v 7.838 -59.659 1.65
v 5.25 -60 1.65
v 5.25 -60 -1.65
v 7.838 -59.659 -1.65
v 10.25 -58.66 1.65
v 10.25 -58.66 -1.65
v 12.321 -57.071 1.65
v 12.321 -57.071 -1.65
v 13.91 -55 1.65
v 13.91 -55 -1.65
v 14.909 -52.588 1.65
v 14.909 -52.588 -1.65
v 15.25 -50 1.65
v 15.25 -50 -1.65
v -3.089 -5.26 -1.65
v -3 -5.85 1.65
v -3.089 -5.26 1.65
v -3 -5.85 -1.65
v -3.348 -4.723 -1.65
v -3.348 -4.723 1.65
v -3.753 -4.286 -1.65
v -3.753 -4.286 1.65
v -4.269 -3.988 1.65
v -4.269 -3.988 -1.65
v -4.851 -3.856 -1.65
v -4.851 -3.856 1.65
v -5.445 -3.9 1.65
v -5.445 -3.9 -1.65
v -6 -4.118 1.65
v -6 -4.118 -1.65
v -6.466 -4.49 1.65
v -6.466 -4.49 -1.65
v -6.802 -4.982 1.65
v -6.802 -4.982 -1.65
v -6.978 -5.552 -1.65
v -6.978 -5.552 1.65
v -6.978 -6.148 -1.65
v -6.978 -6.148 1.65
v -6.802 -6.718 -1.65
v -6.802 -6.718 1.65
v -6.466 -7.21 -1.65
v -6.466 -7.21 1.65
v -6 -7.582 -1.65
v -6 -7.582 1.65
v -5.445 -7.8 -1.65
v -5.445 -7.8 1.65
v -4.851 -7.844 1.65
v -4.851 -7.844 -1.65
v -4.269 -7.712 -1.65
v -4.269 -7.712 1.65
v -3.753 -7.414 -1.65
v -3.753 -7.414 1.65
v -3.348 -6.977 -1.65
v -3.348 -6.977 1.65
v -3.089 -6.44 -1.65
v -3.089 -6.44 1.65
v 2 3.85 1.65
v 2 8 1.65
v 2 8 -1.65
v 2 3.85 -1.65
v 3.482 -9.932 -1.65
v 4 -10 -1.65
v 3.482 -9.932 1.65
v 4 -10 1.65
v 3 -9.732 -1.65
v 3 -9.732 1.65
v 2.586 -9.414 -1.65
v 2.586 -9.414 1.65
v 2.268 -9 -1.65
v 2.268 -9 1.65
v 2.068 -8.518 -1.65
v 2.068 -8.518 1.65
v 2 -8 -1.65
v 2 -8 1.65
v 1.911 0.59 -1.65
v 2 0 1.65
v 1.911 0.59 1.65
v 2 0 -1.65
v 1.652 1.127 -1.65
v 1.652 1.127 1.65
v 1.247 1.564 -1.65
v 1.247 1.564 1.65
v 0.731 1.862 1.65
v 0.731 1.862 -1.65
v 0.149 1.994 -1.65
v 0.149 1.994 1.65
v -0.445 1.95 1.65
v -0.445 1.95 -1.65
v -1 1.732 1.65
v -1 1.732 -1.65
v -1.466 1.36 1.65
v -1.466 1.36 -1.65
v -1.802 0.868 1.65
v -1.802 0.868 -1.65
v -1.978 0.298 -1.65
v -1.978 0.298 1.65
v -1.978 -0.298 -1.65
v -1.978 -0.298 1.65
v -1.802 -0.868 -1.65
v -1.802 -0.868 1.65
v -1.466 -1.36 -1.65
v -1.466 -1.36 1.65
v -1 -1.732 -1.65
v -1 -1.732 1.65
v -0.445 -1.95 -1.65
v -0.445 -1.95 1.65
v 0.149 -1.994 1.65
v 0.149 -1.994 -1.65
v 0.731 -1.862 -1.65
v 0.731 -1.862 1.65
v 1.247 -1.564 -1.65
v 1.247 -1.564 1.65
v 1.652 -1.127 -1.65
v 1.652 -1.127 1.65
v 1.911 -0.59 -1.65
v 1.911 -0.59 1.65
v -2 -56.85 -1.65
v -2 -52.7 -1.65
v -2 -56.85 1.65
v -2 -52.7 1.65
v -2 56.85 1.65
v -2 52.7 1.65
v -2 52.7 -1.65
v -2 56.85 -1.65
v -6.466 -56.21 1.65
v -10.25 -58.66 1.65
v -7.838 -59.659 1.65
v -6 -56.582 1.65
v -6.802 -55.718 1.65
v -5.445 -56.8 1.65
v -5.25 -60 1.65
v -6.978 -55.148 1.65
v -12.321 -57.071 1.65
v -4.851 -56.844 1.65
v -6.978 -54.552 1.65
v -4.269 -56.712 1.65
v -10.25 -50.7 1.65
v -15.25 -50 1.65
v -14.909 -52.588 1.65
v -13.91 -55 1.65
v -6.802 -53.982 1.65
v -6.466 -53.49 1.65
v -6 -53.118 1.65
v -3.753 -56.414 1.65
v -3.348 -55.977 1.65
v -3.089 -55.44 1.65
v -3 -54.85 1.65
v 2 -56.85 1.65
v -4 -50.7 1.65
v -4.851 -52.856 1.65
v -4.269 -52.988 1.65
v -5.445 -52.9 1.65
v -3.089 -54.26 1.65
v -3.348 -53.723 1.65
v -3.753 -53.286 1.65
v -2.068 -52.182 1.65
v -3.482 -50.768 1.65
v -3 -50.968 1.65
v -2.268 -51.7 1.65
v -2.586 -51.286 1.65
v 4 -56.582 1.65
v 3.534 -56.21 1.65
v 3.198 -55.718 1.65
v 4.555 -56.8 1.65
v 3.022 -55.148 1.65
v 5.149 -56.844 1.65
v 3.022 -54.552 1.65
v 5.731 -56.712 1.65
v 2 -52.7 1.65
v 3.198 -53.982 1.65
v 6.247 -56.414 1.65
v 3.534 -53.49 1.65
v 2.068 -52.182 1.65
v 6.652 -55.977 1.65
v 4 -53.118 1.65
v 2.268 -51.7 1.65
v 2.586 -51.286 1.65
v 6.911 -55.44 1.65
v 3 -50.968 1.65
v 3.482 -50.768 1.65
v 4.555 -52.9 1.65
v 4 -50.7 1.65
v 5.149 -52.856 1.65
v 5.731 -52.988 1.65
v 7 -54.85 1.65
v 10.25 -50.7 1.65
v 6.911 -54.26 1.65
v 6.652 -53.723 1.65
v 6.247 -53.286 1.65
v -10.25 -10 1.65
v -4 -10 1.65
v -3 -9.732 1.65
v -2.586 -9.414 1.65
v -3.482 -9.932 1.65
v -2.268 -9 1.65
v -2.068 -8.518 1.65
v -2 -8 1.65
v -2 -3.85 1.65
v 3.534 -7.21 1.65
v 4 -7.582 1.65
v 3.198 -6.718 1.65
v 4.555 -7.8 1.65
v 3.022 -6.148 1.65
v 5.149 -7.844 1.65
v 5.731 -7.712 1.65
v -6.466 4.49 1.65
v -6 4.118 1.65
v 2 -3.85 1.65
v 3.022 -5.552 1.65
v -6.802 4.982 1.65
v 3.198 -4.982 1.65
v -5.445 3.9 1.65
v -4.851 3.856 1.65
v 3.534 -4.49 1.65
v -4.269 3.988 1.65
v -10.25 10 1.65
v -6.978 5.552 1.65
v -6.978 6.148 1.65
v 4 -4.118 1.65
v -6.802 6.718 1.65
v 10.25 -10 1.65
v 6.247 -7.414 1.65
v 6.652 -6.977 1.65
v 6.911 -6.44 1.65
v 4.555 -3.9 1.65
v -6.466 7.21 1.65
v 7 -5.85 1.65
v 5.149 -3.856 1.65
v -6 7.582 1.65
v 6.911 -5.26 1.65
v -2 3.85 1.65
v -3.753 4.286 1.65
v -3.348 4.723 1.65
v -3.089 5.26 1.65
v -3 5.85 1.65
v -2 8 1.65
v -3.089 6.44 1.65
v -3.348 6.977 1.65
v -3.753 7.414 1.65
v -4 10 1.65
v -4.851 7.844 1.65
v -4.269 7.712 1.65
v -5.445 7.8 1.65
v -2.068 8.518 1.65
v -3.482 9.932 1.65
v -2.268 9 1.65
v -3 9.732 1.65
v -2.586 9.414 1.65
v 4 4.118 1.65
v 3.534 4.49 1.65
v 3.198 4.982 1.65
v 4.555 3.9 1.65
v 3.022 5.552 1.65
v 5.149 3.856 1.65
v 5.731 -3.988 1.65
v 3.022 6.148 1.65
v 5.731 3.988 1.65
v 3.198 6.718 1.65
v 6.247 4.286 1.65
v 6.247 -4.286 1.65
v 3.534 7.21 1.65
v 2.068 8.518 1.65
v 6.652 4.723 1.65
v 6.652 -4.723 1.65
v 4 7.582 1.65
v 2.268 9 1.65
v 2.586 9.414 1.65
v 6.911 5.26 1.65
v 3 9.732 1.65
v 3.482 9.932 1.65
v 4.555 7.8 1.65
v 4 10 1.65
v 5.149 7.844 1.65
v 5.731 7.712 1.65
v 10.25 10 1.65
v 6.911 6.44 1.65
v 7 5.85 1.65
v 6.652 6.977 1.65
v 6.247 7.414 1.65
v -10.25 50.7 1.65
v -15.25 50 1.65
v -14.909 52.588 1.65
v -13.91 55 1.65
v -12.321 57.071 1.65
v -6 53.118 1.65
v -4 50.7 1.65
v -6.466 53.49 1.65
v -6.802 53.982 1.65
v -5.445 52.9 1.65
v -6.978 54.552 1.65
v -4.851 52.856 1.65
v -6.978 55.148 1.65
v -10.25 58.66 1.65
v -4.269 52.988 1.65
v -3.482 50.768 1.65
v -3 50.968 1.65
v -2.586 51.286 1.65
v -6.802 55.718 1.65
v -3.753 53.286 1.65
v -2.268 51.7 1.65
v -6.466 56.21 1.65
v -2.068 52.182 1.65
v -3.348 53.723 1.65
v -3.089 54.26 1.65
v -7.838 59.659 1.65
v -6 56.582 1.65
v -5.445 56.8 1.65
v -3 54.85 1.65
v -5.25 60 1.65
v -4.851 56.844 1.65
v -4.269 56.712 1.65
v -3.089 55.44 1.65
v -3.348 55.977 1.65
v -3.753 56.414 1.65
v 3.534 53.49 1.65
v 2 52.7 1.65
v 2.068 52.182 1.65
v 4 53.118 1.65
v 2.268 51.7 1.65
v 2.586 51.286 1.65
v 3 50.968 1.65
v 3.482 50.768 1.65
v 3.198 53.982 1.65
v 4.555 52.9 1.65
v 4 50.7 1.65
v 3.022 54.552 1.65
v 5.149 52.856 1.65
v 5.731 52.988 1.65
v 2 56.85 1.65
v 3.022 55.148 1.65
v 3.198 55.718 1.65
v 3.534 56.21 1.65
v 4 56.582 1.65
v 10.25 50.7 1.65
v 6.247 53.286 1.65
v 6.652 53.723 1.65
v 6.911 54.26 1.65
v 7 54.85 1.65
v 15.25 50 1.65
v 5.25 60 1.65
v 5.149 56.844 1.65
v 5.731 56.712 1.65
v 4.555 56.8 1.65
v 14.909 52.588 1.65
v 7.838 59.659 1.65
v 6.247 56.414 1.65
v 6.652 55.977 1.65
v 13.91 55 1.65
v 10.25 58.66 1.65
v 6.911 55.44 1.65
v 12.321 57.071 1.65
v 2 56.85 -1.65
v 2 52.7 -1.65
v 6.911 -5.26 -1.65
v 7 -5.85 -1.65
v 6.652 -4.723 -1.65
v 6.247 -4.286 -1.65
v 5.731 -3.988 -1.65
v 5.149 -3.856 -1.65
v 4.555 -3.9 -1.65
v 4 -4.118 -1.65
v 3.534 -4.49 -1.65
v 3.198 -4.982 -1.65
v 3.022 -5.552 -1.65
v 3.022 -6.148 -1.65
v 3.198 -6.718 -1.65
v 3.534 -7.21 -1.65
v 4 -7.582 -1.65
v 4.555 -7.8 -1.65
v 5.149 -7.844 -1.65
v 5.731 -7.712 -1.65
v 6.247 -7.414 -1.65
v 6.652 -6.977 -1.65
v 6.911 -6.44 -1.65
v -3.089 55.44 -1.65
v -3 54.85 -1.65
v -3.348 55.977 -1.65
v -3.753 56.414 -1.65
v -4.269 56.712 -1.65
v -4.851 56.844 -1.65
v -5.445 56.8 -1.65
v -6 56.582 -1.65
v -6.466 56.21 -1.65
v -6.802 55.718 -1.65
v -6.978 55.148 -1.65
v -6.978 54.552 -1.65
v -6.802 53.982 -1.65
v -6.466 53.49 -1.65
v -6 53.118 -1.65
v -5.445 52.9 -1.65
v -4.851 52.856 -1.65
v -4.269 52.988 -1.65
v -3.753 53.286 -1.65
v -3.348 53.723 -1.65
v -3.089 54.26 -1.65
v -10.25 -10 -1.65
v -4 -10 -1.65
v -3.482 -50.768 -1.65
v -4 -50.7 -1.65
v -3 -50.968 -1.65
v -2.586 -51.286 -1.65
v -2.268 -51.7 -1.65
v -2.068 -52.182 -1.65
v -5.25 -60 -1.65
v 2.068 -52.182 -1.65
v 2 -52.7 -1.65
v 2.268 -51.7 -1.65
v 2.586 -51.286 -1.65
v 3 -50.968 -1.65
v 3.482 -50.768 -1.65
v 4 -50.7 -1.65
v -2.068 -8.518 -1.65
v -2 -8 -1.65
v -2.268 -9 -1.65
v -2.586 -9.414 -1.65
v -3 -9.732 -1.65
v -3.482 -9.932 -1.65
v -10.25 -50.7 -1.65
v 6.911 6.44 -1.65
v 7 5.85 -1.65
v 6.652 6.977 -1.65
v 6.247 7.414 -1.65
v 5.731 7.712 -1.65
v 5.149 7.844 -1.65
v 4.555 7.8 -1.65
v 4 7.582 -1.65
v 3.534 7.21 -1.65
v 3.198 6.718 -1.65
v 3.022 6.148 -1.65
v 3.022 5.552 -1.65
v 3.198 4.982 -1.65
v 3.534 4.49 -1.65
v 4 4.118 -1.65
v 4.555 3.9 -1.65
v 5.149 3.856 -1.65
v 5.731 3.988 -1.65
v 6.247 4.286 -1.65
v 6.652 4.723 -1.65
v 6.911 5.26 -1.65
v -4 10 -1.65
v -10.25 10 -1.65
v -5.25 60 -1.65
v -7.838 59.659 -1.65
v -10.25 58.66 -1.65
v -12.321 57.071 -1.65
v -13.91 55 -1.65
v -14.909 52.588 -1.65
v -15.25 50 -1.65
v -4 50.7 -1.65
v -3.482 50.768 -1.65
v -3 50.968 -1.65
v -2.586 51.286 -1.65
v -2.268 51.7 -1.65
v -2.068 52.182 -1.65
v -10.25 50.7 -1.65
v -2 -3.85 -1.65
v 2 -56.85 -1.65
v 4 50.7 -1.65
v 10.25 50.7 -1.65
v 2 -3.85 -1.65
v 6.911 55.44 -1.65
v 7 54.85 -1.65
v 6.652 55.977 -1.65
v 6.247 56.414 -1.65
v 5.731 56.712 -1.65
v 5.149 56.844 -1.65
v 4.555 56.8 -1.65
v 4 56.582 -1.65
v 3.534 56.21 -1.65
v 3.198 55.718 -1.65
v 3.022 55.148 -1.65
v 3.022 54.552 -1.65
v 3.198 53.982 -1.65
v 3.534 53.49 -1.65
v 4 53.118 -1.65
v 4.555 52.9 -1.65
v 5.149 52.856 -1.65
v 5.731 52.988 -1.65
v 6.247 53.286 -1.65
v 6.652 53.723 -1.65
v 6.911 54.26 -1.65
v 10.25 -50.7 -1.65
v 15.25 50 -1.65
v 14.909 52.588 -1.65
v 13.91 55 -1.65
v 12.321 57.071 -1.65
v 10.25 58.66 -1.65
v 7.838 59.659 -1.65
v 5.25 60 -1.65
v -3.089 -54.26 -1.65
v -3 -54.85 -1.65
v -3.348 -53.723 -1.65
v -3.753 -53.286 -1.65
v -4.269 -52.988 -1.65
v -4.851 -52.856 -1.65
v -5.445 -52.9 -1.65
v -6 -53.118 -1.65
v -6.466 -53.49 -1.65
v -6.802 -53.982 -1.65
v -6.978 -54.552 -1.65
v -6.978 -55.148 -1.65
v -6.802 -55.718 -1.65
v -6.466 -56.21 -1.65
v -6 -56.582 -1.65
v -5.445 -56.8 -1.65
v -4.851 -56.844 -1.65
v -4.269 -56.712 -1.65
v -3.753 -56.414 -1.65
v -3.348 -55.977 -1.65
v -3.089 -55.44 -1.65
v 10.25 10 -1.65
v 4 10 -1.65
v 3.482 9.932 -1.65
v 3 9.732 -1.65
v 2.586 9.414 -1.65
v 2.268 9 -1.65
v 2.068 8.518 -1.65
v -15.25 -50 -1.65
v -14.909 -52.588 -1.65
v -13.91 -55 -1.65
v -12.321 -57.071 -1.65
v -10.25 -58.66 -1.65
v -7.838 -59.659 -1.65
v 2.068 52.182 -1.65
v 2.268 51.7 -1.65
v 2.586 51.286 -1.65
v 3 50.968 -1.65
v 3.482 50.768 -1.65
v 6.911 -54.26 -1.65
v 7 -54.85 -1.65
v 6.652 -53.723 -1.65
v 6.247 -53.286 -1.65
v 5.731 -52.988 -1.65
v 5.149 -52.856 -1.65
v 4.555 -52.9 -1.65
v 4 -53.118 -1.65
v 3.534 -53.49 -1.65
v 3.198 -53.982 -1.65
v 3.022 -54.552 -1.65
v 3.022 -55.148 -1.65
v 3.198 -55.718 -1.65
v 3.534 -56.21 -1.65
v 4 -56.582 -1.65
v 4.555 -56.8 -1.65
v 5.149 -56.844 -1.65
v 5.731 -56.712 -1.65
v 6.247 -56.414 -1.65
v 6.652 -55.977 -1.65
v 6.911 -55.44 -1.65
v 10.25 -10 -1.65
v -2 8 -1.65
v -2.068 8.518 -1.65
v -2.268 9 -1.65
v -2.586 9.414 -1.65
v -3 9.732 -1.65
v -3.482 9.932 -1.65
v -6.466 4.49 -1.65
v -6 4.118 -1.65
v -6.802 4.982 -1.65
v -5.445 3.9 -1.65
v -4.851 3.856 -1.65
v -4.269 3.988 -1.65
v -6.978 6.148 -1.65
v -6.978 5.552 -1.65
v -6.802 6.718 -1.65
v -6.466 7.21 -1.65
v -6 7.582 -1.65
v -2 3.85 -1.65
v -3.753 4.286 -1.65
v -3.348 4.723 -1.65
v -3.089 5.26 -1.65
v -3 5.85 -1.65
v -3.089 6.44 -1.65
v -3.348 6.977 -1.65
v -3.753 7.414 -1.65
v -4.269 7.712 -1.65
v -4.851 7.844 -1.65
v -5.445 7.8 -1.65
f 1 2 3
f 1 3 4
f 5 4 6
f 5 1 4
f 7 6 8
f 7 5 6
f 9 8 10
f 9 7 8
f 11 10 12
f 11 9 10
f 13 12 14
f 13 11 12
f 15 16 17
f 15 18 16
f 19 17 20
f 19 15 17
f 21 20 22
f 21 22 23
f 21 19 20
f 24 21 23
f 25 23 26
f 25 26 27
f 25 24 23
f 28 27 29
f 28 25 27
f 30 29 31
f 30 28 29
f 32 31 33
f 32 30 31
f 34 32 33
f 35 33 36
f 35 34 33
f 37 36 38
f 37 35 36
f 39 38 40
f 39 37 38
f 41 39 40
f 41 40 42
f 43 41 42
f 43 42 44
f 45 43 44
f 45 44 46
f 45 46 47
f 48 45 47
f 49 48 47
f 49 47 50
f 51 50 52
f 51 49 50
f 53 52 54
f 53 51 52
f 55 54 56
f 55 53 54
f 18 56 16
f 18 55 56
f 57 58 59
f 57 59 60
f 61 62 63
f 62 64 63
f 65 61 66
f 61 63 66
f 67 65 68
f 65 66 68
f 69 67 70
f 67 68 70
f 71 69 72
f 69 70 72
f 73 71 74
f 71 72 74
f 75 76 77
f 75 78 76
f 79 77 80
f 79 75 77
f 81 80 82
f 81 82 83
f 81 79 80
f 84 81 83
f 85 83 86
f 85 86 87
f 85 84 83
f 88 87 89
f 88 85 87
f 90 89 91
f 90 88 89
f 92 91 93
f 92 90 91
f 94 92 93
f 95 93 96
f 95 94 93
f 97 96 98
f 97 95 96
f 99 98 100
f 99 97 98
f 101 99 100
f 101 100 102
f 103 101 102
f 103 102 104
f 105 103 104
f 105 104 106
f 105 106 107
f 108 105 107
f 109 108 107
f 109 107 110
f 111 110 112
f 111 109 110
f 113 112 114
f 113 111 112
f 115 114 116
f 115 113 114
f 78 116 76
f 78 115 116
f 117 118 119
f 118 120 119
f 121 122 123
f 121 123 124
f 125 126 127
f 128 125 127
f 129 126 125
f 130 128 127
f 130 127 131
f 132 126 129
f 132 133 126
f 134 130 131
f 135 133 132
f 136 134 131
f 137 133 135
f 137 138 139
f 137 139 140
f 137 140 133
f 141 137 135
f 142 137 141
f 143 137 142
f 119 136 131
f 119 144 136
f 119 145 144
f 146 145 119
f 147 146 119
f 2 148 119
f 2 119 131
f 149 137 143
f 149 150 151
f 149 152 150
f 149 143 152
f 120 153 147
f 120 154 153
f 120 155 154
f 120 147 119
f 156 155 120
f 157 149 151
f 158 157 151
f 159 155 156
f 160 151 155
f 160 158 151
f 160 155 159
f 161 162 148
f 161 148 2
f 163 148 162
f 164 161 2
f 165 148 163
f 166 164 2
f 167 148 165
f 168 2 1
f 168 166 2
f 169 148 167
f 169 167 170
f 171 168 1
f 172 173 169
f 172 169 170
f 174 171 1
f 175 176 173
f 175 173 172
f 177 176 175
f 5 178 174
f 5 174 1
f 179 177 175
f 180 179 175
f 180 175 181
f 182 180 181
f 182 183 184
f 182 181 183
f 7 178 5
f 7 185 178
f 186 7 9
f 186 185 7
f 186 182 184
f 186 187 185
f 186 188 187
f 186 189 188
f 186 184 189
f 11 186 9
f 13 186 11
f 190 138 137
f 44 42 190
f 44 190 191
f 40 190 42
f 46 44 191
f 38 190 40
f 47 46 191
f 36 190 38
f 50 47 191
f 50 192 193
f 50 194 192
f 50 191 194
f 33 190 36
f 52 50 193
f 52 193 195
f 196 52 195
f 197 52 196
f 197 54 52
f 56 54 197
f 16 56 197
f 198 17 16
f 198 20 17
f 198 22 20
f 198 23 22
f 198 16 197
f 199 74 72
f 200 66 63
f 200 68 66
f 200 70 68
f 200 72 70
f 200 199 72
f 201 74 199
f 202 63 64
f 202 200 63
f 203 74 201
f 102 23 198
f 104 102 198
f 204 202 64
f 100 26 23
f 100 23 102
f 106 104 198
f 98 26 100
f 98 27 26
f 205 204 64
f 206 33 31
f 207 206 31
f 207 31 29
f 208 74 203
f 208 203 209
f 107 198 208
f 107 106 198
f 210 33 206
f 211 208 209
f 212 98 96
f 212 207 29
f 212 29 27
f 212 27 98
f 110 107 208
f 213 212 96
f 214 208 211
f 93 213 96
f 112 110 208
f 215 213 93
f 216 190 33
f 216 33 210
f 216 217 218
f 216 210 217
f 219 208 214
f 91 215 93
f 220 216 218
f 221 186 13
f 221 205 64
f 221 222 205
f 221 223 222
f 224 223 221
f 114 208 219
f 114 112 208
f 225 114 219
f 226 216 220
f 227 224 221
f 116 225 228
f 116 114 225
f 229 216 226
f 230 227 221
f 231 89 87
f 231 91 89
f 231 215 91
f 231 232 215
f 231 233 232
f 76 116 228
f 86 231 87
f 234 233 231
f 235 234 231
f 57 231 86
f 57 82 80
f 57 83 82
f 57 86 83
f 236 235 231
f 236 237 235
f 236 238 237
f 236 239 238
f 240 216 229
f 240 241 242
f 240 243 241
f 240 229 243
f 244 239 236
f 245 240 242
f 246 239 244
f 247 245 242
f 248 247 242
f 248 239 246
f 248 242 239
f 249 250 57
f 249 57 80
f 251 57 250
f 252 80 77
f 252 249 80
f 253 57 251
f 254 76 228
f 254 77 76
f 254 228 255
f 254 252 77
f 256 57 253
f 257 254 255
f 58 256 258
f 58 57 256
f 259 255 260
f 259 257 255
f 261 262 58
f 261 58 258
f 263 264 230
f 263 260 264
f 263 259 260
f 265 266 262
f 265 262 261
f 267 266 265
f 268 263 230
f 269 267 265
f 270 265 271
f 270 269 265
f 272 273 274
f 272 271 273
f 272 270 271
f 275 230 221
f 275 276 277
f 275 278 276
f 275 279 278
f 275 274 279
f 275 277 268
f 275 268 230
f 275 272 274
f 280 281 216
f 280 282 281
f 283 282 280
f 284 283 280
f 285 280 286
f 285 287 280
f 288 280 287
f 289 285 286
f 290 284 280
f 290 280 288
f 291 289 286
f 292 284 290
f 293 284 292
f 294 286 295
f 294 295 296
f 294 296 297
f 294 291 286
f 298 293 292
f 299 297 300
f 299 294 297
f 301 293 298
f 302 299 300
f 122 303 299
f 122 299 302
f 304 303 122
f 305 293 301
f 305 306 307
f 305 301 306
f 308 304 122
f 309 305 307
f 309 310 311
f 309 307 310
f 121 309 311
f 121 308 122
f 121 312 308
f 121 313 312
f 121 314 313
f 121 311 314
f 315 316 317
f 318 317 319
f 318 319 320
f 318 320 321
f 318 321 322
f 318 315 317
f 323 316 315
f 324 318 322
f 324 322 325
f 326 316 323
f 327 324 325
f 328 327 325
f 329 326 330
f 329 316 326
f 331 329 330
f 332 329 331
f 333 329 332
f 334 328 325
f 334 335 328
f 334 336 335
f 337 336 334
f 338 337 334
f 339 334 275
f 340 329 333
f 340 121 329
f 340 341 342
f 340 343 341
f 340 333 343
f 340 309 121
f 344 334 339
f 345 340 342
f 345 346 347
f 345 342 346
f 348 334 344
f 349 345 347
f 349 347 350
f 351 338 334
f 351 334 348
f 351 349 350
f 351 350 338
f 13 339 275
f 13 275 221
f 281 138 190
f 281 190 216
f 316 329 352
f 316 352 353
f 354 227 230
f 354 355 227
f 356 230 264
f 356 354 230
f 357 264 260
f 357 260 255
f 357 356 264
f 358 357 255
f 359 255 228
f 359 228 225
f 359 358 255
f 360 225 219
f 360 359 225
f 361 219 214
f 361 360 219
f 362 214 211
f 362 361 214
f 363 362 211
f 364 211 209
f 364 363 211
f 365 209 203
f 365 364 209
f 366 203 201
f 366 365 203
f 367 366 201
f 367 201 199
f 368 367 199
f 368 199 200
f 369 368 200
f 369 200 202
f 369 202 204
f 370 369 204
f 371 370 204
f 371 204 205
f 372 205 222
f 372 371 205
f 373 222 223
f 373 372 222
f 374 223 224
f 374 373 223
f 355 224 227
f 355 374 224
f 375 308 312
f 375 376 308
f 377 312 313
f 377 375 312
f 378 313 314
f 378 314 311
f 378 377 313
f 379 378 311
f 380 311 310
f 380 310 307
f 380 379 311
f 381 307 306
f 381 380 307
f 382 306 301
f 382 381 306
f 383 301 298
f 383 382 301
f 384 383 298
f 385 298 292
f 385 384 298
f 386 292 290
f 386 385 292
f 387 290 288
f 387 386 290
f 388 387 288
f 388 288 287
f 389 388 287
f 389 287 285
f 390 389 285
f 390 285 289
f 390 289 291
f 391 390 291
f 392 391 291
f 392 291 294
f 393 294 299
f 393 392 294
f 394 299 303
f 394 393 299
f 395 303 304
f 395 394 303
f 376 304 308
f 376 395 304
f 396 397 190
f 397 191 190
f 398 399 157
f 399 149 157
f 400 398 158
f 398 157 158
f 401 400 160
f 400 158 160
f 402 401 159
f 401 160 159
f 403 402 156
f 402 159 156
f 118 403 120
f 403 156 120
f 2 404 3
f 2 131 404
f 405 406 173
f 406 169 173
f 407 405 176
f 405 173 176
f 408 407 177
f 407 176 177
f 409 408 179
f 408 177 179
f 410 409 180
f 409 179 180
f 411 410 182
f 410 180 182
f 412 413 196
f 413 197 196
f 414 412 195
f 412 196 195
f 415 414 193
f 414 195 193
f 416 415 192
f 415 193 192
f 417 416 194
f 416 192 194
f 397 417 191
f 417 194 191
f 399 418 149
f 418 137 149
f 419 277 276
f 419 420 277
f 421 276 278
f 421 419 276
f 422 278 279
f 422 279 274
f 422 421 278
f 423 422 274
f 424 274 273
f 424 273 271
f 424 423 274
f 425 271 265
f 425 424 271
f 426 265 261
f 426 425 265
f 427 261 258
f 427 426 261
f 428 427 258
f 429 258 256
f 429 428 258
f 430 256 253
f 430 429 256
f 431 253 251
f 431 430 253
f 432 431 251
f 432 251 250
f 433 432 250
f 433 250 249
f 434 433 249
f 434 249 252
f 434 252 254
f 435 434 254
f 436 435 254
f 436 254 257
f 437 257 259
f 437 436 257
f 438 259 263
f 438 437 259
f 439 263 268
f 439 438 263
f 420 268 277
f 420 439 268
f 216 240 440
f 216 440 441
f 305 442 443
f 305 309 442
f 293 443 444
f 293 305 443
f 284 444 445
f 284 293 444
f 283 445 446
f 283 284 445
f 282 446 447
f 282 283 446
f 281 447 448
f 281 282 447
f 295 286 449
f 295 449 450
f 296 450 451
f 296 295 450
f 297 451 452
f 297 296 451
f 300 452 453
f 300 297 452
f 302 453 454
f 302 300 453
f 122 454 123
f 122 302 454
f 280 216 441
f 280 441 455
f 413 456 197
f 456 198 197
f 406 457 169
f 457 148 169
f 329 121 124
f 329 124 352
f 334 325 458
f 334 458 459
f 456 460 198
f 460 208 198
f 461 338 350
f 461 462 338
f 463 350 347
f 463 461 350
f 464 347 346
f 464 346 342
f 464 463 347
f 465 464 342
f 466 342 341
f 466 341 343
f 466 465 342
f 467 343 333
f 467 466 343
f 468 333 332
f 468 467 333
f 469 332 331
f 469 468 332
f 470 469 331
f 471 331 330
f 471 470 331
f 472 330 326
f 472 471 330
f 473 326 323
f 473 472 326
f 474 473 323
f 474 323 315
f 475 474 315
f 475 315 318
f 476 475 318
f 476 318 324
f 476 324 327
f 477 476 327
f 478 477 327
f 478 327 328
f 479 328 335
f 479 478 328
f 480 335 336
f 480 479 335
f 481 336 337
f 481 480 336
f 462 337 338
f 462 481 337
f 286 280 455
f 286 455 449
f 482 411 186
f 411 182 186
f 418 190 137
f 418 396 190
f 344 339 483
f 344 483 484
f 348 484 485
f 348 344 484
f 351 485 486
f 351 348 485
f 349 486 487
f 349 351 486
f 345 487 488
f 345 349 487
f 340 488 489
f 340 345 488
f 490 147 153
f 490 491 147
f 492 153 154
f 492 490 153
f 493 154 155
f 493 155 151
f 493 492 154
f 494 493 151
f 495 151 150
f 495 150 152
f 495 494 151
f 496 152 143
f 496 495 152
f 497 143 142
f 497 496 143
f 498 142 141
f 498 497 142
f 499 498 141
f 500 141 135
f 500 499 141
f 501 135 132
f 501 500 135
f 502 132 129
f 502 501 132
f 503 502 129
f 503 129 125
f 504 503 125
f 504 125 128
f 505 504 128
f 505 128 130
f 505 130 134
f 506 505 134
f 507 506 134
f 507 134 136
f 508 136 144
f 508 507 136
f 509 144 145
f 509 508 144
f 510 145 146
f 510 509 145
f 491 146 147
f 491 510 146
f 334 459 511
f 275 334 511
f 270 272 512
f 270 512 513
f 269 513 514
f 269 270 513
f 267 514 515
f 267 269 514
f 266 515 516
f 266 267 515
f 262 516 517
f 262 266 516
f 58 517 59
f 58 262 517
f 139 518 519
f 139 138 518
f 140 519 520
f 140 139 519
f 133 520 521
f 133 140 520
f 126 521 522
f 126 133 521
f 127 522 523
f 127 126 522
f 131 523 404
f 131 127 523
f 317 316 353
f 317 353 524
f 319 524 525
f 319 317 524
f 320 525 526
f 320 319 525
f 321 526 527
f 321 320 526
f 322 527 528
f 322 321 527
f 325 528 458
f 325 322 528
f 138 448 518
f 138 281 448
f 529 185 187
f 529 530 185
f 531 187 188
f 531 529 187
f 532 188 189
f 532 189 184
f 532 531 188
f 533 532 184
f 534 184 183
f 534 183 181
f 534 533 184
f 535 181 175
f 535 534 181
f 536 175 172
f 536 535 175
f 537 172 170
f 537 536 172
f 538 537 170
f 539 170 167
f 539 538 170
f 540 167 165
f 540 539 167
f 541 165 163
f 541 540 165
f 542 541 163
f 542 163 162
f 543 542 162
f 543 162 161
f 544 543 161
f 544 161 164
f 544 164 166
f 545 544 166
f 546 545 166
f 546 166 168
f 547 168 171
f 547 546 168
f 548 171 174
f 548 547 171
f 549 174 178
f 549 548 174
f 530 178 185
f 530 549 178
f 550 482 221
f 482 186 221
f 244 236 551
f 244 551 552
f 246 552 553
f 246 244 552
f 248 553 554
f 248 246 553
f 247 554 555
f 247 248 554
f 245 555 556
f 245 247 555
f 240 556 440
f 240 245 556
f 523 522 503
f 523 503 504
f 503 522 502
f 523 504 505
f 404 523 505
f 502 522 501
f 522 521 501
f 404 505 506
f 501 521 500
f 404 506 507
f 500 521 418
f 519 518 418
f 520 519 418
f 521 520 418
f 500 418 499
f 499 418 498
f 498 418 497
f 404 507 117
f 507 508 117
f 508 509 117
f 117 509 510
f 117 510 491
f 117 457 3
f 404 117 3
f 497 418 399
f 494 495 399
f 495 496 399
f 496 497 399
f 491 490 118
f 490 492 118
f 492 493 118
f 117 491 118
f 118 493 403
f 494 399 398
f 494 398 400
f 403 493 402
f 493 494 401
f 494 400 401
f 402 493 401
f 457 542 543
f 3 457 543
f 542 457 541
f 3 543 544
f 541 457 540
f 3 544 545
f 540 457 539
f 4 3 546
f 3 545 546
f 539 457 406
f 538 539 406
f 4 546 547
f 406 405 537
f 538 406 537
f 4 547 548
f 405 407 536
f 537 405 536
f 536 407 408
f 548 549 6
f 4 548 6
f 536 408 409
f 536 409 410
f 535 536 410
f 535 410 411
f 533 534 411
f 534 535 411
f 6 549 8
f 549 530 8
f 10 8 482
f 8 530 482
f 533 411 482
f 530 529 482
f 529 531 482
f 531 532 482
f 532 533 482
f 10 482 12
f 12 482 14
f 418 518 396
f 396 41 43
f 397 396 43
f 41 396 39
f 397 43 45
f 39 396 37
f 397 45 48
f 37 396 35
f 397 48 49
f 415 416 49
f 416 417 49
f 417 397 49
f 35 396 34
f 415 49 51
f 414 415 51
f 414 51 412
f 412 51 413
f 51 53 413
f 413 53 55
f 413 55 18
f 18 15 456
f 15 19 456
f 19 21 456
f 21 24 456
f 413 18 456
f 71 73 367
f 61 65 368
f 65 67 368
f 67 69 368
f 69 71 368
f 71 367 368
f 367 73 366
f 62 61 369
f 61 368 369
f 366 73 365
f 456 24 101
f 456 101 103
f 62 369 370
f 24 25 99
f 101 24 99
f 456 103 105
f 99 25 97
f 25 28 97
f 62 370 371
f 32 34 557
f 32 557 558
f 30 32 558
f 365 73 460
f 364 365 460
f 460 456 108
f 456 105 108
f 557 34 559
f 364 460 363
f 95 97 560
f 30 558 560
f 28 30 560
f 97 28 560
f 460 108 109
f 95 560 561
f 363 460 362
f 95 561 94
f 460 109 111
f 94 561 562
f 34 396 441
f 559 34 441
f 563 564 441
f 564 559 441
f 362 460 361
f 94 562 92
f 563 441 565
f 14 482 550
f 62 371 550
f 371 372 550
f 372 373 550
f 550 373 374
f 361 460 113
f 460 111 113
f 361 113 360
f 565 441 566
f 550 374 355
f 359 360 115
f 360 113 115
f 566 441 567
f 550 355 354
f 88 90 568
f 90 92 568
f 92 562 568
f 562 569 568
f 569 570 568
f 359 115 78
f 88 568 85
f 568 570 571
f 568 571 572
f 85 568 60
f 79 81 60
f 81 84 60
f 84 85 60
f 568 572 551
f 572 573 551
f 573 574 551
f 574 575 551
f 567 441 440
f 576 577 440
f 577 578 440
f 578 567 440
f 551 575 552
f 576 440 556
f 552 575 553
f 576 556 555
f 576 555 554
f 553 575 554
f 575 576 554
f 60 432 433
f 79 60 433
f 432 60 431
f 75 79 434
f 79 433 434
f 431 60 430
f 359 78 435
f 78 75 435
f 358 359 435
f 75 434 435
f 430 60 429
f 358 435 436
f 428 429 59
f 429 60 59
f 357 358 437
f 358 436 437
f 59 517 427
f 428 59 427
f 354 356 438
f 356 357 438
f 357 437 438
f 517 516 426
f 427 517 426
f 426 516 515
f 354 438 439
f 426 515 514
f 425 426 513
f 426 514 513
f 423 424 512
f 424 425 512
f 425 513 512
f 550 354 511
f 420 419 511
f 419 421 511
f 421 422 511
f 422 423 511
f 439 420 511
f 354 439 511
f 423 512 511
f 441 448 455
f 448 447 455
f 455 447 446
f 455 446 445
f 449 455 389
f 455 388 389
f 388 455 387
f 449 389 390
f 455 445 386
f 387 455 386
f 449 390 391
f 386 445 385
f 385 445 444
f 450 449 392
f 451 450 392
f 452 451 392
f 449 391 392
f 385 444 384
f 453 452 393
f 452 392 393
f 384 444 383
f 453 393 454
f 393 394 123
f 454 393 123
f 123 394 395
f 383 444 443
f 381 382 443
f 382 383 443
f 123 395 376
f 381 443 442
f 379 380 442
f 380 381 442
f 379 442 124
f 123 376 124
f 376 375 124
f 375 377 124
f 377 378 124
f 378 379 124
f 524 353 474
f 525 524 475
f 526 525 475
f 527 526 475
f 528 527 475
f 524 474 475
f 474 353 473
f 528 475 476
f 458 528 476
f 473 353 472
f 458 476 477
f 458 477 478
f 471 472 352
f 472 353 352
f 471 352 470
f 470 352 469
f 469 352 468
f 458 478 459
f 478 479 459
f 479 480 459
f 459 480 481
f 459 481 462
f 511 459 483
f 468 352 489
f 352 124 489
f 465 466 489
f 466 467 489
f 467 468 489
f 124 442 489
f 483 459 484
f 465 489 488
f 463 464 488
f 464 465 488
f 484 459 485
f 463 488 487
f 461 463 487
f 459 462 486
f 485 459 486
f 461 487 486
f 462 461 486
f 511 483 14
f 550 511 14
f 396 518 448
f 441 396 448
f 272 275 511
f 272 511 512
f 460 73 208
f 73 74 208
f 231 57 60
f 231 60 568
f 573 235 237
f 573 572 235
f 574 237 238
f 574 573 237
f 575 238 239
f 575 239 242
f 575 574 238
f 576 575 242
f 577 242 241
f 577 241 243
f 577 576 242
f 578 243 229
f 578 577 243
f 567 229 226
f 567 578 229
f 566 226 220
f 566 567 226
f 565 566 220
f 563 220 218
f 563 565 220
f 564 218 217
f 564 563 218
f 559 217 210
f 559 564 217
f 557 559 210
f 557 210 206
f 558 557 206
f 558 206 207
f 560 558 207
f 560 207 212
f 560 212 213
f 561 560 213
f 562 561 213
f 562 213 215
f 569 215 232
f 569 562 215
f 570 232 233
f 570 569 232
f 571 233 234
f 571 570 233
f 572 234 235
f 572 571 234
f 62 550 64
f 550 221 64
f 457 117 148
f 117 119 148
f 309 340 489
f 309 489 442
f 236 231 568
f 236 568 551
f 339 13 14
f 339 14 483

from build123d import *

# Parameters (mm, degrees)
SKETCH2_R           = 2
BOSS_EXTRUDE1_DEPTH = 1.65


with BuildPart() as part:
    # Sketch2 → Boss-Extrude1 (new body, symmetric)
    with BuildSketch(Plane.XY):
        with BuildLine():
            Line((-5.25, -60), (5.25, -60))
            ThreePointArc((5.25, -60), (12.321067812, -57.071067812), (15.25, -50))
            Line((15.25, -50), (15.25, 50))
            ThreePointArc((15.25, 50), (12.321067812, 57.071067812), (5.25, 60))
            Line((5.25, 60), (-5.25, 60))
            ThreePointArc((-5.25, 60), (-12.321067812, 57.071067812), (-15.25, 50))
            Line((-15.25, 50), (-15.25, -50))
            ThreePointArc((-15.25, -50), (-12.321067812, -57.071067812), (-5.25, -60))
        make_face()
        Circle(SKETCH2_R, mode=Mode.SUBTRACT)
        with Locations((5, 5.85)):
            Circle(SKETCH2_R, mode=Mode.SUBTRACT)
        with Locations((5, -5.85)):
            Circle(SKETCH2_R, mode=Mode.SUBTRACT)
        with Locations((-5, -5.85)):
            Circle(SKETCH2_R, mode=Mode.SUBTRACT)
        with Locations((-5, 5.85)):
            Circle(SKETCH2_R, mode=Mode.SUBTRACT)
        with Locations((5, 54.85)):
            Circle(SKETCH2_R, mode=Mode.SUBTRACT)
        with Locations((5, -54.85)):
            Circle(SKETCH2_R, mode=Mode.SUBTRACT)
        with Locations((-5, -54.85)):
            Circle(SKETCH2_R, mode=Mode.SUBTRACT)
        with Locations((-5, 54.85)):
            Circle(SKETCH2_R, mode=Mode.SUBTRACT)
        with BuildLine():
            Line((-10.25, 50.7), (-4, 50.7))
            ThreePointArc((-4, 50.7), (-2.585786438, 51.285786438), (-2, 52.7))
            Line((-2, 52.7), (-2, 56.85))
            Line((-2, 56.85), (2, 56.85))
            Line((2, 56.85), (2, 52.7))
            ThreePointArc((2, 52.7), (2.585786438, 51.285786438), (4, 50.7))
            Line((4, 50.7), (10.25, 50.7))
            Line((10.25, 50.7), (10.25, 10))
            Line((10.25, 10), (4, 10))
            ThreePointArc((4, 10), (2.585786438, 9.414213562), (2, 8))
            Line((2, 8), (2, 3.85))
            Line((2, 3.85), (-2, 3.85))
            Line((-2, 3.85), (-2, 8))
            ThreePointArc((-2, 8), (-2.585786438, 9.414213562), (-4, 10))
            Line((-4, 10), (-10.25, 10))
            Line((-10.25, 10), (-10.25, 50.7))
        make_face(mode=Mode.SUBTRACT)
        with BuildLine():
            Line((-10.25, -50.7), (-4, -50.7))
            ThreePointArc((-4, -50.7), (-2.585786438, -51.285786438), (-2, -52.7))
            Line((-2, -52.7), (-2, -56.85))
            Line((-2, -56.85), (2, -56.85))
            Line((2, -56.85), (2, -52.7))
            ThreePointArc((2, -52.7), (2.585786438, -51.285786438), (4, -50.7))
            Line((4, -50.7), (10.25, -50.7))
            Line((10.25, -50.7), (10.25, -10))
            Line((10.25, -10), (4, -10))
            ThreePointArc((4, -10), (2.585786438, -9.414213562), (2, -8))
            Line((2, -8), (2, -3.85))
            Line((2, -3.85), (-2, -3.85))
            Line((-2, -3.85), (-2, -8))
            ThreePointArc((-2, -8), (-2.585786438, -9.414213562), (-4, -10))
            Line((-4, -10), (-10.25, -10))
            Line((-10.25, -10), (-10.25, -50.7))
        make_face(mode=Mode.SUBTRACT)
    extrude(amount=BOSS_EXTRUDE1_DEPTH, both=True)


solid = part.part
